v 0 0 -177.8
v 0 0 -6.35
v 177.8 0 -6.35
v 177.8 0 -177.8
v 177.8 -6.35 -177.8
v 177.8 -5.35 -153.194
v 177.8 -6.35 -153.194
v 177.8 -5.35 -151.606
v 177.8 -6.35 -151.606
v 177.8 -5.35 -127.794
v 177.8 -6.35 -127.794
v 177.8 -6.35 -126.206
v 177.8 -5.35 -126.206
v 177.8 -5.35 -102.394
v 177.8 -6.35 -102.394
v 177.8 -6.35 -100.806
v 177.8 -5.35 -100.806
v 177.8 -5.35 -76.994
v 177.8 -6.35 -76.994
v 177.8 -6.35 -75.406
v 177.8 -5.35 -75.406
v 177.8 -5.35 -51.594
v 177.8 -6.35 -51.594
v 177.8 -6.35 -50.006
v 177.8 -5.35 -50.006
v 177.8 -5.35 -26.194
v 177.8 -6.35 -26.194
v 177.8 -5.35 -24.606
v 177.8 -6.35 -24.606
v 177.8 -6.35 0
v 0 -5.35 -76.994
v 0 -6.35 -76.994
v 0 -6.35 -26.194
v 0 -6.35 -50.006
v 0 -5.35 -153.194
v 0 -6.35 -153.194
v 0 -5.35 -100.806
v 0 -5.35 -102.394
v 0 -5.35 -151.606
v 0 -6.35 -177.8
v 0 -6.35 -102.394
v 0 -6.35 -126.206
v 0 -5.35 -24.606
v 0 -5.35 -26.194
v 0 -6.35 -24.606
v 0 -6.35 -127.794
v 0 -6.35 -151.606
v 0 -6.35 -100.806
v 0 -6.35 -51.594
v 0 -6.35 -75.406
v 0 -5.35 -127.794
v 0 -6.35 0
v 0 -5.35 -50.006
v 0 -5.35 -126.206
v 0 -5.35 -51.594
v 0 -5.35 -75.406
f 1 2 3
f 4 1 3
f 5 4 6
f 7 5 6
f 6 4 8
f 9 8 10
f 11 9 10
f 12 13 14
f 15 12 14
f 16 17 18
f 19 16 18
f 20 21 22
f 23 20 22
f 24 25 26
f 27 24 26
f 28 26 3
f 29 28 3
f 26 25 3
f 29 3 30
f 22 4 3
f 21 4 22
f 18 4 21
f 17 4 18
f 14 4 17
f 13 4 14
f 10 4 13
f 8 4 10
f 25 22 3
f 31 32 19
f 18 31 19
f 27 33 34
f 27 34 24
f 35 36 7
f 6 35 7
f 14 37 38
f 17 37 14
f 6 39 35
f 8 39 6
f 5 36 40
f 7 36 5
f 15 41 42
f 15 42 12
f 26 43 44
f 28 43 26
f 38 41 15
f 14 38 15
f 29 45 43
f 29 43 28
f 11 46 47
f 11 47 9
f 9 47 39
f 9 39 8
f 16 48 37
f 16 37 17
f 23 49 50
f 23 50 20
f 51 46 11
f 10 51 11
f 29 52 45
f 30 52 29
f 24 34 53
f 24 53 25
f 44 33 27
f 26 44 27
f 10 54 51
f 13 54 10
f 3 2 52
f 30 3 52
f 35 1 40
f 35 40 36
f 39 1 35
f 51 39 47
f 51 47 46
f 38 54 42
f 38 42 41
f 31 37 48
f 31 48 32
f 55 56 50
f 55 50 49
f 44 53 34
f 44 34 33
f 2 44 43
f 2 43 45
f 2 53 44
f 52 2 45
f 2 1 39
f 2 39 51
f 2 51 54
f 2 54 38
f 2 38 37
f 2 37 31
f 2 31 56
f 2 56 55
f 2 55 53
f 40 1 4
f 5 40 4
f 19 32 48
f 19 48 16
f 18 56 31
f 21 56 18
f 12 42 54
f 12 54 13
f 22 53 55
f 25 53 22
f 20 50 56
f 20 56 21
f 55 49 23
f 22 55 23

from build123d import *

# Parameters (mm, degrees)
F0_W     = 177.8
F0_H     = 177.8
F1_DEPTH = 6.35
F3_DEPTH = 177.801
F4_W     = 177.8
F4_H     = 1.5875
F5_DEPTH = 1


with BuildPart() as f1:
    # F0 (on Front) → F1 (new body)
    with BuildSketch(Plane.XZ):
        with Locations((88.9, -88.9)):
            Rectangle(F0_W, F0_H)
    extrude(amount=F1_DEPTH)

    # F2 (on face) → F3 (cut, through all)
    with BuildSketch(Plane(origin=(0, 0, 0), x_dir=(0, -1, 0), z_dir=(-1, 0, 0))):
        Polygon((0, -6.35), (6.35, 0), (0, 0), align=None)
    extrude(amount=-F3_DEPTH, mode=Mode.SUBTRACT)

    # F4 (on face) → F5 (cut)
    with BuildSketch(Plane.XZ.offset(6.35)):
        with Locations((88.9, -25.4)):
            Rectangle(F4_W, F4_H)
        with Locations((88.9, -50.8)):
            Rectangle(F4_W, F4_H)
        with Locations((88.9, -76.2)):
            Rectangle(F4_W, F4_H)
        with Locations((88.9, -101.6)):
            Rectangle(F4_W, F4_H)
        with Locations((88.9, -127)):
            Rectangle(F4_W, F4_H)
        with Locations((88.9, -152.4)):
            Rectangle(F4_W, F4_H)
    extrude(amount=-F5_DEPTH, mode=Mode.SUBTRACT)


solid = f1.part
